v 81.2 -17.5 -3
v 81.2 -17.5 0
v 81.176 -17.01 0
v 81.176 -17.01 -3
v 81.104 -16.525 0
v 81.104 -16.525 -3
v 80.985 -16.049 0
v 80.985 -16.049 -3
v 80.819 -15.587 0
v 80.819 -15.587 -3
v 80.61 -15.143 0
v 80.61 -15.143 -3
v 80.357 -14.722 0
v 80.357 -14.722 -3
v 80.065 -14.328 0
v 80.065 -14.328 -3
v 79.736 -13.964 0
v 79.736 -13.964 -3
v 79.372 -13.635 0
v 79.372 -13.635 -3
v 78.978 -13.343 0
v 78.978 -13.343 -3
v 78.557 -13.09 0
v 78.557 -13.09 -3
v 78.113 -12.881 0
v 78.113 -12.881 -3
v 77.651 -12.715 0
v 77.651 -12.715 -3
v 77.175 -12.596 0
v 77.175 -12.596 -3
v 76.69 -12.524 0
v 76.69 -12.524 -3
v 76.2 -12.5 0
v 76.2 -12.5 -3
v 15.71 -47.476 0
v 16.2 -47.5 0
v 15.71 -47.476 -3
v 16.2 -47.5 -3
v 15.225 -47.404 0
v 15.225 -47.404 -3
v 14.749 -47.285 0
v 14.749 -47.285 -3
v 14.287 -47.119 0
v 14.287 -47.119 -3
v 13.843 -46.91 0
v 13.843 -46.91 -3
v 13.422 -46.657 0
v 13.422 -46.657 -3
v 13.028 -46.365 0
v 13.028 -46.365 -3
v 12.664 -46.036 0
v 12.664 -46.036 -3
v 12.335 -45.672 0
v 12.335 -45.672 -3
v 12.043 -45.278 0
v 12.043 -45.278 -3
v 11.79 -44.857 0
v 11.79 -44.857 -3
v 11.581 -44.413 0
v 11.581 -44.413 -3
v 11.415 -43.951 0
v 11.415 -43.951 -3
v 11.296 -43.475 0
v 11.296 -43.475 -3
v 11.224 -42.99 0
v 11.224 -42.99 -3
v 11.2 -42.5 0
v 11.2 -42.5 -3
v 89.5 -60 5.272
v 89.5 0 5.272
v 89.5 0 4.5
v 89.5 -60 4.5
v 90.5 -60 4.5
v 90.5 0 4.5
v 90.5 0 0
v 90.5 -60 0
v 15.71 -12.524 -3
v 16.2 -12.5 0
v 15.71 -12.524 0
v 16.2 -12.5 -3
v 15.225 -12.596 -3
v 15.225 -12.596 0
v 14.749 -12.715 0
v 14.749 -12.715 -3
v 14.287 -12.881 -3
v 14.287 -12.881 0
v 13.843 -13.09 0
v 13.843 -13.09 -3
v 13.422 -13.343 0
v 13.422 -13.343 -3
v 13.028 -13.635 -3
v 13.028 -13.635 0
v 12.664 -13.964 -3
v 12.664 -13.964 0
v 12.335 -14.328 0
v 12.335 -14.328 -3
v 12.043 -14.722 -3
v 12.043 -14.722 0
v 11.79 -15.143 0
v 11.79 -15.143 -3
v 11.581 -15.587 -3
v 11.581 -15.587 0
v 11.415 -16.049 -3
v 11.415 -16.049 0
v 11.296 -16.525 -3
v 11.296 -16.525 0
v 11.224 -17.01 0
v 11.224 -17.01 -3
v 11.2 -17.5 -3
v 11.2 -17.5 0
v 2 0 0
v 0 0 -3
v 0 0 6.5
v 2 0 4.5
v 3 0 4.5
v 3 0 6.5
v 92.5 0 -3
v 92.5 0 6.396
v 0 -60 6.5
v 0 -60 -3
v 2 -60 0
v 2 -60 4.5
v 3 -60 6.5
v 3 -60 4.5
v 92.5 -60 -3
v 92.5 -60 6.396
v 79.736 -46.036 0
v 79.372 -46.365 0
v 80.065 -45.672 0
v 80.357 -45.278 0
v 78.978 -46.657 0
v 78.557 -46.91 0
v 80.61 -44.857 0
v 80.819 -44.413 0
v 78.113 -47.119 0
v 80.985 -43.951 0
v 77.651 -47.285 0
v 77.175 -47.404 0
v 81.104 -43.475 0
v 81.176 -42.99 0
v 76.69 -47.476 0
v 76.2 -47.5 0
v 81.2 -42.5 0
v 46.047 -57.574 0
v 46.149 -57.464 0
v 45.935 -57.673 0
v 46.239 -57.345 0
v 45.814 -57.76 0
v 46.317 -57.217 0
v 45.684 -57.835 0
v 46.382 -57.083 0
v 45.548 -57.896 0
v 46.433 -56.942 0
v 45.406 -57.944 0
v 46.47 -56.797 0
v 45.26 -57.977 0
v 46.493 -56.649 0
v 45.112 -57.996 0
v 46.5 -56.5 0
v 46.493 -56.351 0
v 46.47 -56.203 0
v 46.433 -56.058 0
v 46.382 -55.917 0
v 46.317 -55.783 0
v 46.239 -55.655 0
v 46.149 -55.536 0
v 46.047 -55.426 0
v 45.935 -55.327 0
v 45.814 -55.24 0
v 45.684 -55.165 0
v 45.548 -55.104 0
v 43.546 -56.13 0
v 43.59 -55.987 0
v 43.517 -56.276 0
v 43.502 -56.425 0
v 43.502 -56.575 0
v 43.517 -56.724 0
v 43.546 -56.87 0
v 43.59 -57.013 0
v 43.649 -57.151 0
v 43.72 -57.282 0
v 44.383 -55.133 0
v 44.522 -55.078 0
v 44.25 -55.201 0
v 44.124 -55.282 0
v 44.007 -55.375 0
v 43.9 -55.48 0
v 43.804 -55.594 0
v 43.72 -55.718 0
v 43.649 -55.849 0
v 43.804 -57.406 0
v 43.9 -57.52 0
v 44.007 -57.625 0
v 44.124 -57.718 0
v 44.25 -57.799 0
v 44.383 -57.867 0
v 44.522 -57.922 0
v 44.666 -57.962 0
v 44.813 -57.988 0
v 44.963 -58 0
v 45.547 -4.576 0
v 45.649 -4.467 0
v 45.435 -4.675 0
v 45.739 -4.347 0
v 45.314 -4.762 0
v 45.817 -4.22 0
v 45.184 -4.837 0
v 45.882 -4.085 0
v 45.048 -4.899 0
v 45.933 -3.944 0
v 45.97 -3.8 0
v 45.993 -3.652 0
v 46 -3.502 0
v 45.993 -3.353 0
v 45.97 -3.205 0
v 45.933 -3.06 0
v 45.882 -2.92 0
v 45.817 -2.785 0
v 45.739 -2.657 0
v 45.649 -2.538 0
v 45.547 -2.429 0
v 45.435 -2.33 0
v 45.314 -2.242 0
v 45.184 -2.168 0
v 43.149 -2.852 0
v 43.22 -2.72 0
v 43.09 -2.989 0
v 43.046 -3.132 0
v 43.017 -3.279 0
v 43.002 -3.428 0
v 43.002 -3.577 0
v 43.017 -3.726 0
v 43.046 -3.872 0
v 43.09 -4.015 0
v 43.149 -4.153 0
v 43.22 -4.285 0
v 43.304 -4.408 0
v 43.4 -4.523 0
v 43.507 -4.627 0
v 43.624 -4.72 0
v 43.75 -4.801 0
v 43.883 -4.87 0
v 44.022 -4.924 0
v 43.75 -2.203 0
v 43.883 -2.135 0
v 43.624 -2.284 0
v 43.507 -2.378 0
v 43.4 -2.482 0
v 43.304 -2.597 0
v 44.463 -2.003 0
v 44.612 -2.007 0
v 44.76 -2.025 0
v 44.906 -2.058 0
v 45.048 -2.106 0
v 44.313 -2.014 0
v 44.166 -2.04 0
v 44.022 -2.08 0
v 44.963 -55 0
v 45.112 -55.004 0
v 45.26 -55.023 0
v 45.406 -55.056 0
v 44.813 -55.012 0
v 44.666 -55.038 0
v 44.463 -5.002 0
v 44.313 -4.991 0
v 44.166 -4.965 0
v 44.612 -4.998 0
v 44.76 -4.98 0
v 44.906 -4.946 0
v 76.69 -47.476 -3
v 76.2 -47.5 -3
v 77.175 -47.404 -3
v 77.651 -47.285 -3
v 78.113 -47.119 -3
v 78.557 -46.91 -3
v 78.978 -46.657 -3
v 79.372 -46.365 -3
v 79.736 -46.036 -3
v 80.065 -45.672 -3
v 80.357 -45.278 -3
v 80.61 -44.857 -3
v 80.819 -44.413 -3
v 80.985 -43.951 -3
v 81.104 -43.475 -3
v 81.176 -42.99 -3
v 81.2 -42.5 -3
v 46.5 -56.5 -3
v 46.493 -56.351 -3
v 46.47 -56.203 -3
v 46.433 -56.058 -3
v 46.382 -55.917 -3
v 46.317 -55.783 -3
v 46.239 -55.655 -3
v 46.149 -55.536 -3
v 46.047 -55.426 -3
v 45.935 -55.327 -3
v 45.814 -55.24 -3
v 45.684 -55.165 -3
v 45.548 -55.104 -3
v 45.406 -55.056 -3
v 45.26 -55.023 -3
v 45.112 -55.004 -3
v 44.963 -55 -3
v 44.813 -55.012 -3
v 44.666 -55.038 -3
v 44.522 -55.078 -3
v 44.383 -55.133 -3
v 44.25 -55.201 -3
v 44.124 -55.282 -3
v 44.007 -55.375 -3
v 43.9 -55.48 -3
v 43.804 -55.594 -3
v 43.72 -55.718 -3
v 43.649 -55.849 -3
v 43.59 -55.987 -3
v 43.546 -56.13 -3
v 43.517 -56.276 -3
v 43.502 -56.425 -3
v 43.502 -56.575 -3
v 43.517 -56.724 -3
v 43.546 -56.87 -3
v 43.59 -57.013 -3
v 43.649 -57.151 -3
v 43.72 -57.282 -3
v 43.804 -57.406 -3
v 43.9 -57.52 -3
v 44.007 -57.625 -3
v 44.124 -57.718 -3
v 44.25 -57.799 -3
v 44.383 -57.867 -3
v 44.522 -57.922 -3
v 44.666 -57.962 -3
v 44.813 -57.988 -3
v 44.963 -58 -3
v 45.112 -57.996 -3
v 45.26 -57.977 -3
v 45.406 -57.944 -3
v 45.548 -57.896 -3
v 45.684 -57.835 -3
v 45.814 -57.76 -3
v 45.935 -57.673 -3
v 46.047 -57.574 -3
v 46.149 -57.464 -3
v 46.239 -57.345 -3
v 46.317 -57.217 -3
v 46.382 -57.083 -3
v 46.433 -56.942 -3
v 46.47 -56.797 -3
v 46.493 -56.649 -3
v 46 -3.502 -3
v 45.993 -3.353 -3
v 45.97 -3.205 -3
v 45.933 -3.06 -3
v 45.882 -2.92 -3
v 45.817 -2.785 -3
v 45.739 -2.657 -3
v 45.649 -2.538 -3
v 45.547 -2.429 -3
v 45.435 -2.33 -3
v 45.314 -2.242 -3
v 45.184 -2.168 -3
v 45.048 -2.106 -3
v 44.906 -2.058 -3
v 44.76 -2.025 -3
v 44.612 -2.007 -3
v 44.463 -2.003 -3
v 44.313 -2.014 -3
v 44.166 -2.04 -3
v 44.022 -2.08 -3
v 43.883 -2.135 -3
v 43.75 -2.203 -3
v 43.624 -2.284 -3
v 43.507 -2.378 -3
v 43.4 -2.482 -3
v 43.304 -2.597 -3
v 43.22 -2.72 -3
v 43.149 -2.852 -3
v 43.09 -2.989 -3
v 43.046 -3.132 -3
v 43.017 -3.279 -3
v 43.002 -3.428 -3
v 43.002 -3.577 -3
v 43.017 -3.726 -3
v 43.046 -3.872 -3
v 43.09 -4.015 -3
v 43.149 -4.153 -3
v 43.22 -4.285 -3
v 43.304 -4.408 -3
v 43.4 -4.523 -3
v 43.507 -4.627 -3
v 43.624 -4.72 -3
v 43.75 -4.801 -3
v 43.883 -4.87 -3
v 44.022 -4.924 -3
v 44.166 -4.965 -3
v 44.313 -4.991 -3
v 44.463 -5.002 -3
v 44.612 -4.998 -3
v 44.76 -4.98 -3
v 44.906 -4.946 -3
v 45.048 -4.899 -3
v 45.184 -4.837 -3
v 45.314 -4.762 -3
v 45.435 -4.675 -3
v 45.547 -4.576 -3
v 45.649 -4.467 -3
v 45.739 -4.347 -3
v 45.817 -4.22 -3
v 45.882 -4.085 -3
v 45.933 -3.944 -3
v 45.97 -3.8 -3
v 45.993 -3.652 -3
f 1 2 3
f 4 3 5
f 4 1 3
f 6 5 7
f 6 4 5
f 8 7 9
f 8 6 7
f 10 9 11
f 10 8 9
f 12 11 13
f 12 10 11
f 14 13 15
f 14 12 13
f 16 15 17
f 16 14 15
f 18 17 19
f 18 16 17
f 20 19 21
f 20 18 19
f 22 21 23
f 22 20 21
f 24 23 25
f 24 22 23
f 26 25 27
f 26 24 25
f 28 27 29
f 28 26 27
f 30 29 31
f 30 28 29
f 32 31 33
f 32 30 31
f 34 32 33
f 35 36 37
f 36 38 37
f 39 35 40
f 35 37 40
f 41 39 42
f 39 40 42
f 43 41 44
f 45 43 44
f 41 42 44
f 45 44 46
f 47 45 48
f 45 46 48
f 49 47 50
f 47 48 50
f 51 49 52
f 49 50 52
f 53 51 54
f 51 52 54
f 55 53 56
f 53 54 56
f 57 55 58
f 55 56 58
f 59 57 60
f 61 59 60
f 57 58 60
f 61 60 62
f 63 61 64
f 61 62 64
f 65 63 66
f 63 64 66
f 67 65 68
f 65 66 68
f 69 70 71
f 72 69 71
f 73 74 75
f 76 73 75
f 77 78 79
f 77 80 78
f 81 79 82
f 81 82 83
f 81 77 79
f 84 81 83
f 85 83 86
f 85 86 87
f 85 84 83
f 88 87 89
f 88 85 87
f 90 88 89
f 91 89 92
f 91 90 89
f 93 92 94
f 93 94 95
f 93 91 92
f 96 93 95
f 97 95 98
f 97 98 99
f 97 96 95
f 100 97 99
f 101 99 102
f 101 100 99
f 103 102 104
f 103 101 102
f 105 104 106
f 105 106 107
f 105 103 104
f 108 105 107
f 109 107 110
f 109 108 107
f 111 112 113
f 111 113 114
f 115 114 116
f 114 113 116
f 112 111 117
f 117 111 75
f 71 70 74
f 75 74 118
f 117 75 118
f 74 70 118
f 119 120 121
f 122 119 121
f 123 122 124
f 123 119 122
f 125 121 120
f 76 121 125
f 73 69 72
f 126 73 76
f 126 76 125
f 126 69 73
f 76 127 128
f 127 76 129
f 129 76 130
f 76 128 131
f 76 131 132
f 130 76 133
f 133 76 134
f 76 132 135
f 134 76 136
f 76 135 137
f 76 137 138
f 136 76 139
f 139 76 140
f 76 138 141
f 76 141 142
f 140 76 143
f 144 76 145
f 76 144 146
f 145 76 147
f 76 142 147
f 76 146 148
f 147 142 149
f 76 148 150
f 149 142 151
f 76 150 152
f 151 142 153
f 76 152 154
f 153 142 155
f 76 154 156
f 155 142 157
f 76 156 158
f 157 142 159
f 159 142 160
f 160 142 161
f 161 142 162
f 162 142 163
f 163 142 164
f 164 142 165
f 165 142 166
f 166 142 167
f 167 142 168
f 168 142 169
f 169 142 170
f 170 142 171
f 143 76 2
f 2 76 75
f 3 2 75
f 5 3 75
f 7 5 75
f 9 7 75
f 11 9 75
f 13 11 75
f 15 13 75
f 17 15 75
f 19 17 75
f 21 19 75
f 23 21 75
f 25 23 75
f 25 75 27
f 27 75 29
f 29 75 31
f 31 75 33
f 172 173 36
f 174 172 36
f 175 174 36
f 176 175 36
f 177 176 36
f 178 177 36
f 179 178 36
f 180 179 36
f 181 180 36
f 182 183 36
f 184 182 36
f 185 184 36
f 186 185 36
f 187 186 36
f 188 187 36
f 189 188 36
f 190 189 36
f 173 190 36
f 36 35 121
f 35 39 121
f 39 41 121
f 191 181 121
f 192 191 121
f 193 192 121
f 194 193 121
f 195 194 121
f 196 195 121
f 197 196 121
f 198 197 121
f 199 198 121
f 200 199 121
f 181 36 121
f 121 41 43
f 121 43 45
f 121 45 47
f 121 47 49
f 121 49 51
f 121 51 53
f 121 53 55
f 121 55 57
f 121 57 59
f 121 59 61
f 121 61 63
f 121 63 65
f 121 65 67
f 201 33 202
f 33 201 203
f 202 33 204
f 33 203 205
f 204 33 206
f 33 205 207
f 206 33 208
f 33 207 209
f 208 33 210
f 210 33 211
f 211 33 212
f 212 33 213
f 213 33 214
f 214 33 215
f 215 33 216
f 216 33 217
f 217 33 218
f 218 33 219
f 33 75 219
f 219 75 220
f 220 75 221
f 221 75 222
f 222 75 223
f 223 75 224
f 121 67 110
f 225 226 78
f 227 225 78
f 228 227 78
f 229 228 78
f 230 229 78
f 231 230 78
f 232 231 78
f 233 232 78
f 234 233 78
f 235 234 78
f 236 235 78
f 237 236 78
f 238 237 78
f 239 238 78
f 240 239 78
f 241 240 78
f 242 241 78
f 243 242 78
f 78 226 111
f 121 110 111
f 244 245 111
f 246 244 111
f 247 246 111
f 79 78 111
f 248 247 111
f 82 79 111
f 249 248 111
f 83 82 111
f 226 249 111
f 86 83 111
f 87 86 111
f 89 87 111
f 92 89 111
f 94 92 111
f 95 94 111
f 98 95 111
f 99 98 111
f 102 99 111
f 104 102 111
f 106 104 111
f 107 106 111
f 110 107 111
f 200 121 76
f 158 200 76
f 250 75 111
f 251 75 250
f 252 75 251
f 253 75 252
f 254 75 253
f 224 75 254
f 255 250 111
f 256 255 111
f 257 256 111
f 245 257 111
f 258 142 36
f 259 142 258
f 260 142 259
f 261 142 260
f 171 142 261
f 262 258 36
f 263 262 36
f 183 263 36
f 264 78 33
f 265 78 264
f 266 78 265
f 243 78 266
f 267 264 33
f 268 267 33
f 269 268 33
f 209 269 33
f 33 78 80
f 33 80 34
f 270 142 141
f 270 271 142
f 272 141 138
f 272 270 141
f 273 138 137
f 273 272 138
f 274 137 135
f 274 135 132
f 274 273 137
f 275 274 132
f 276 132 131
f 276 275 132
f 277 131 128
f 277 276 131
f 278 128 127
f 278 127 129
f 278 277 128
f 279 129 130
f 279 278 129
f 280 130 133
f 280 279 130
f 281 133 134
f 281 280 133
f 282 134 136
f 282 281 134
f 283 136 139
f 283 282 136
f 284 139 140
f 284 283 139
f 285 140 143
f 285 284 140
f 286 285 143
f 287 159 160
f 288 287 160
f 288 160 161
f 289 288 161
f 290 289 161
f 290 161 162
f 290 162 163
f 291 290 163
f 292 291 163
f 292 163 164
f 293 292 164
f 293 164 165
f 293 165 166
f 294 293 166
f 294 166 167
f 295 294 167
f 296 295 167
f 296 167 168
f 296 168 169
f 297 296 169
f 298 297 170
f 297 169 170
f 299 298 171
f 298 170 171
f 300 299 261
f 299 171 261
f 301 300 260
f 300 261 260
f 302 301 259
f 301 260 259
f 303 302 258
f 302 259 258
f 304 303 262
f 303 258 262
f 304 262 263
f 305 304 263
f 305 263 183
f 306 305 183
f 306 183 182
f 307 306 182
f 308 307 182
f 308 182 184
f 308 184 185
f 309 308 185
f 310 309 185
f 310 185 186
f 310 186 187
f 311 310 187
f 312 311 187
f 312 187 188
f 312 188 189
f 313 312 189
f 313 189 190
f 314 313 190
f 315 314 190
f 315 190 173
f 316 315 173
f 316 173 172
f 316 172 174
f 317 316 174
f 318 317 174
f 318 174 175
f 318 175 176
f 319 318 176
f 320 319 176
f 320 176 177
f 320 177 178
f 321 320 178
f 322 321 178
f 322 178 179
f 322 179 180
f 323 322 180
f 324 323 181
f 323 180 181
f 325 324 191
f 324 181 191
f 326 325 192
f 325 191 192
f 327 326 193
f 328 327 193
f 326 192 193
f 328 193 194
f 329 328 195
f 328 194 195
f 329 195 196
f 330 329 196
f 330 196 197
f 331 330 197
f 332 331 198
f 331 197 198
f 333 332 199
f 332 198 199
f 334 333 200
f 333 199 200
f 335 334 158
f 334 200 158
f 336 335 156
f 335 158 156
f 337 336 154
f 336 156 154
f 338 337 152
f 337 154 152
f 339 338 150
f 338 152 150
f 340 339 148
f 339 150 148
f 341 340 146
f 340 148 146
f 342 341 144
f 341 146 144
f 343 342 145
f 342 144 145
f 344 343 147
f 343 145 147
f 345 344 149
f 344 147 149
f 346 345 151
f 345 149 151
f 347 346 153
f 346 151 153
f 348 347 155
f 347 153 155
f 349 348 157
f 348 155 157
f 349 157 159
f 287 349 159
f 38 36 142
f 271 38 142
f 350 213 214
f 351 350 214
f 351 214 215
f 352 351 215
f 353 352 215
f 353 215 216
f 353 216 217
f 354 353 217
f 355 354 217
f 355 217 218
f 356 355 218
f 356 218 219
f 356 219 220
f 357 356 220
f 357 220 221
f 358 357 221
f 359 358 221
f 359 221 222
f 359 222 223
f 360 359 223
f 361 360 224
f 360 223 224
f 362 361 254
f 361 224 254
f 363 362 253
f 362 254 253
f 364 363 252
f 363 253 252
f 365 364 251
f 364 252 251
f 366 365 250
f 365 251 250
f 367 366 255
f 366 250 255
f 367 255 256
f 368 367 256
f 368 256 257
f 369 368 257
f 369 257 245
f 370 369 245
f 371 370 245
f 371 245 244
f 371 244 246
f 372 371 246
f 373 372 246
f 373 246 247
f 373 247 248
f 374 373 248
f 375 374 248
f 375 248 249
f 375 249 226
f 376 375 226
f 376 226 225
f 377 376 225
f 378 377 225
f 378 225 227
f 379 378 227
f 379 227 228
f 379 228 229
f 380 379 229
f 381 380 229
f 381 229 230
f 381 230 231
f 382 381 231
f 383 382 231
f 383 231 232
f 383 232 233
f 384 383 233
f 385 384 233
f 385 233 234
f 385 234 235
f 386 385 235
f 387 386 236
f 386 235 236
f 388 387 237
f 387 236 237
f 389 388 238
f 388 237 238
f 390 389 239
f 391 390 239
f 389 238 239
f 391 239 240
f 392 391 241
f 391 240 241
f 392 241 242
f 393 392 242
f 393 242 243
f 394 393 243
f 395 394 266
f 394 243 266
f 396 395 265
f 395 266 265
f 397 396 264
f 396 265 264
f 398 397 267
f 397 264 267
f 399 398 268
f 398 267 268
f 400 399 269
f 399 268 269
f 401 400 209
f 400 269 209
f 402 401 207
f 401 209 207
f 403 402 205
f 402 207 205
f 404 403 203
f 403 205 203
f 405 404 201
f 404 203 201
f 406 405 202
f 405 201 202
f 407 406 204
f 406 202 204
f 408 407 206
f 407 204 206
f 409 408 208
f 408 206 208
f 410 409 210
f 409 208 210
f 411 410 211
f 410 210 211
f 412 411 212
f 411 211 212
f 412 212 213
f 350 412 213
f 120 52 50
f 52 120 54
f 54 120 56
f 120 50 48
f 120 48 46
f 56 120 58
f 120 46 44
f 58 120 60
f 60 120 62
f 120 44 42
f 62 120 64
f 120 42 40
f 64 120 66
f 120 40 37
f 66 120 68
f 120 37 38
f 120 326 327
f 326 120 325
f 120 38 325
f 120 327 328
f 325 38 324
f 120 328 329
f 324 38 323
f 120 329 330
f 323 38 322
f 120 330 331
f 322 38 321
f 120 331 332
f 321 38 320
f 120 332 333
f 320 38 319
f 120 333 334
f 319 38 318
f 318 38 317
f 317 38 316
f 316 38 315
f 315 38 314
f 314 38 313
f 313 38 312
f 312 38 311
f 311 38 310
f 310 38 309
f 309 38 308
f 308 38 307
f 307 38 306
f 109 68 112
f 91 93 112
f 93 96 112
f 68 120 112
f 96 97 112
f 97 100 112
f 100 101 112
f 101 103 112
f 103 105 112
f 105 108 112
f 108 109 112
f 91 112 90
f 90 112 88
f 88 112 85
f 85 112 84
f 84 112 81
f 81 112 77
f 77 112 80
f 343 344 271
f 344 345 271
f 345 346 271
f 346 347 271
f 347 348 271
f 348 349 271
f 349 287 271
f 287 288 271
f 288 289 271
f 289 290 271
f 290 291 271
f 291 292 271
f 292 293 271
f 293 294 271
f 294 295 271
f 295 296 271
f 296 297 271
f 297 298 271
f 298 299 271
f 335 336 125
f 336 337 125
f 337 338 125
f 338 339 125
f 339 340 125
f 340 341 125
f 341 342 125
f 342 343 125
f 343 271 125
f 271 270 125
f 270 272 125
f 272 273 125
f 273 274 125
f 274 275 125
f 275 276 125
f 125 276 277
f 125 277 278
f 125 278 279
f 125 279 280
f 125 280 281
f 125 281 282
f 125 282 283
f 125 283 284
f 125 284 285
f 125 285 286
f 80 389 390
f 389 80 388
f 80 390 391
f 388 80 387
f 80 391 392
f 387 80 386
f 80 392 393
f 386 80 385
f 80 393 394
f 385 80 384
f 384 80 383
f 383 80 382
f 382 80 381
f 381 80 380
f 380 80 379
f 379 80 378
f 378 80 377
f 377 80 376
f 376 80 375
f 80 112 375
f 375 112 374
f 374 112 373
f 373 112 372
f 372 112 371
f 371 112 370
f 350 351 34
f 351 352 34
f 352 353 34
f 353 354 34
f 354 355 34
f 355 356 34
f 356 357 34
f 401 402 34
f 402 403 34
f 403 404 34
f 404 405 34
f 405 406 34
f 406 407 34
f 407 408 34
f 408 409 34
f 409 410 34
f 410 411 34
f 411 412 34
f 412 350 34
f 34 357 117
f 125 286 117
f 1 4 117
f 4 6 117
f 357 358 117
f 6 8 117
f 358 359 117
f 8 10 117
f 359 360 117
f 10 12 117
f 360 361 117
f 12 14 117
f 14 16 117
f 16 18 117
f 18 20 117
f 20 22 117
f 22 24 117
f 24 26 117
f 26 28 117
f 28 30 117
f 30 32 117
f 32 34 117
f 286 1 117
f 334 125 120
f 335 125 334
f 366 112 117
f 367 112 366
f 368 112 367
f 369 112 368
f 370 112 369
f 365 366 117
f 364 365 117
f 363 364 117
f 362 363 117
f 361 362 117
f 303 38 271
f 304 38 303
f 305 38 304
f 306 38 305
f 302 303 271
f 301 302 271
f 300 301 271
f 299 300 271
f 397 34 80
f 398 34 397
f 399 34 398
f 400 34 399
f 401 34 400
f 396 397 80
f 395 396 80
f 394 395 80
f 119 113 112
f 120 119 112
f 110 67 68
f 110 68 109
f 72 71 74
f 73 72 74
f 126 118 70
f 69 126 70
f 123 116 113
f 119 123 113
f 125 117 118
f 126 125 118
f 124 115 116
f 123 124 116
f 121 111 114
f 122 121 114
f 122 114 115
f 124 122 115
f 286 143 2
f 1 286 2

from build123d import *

# Parameters (mm, degrees)
F1_DEPTH = 60
F2_R     = 1.5
F3_DEPTH = 25
F4_W     = 70
F4_H     = 35
F5_DEPTH = 25
F6_R     = 5


with BuildPart() as f1:
    # F0 (on Front) → F1 (new body)
    with BuildSketch(Plane.XZ):
        Polygon((0, 6.5), (0, 0), (0, -3), (3, -3), (92.5, -3), (92.5, 0), (92.5, 6.395918), (89.5, 5.27192), (89.5, 4.5), (90.5, 4.5), (90.5, 0), (2, 0), (2, 4.5), (3, 4.5), (3, 6.5), align=None)
    extrude(amount=F1_DEPTH)

    # F2 (on face) → F3 (cut)
    with BuildSketch(Plane.XY):
        with Locations((45, -56.5)):
            Circle(F2_R)
        with Locations((44.5, -3.502359)):
            Circle(F2_R)
    extrude(amount=-F3_DEPTH, mode=Mode.SUBTRACT)

    # F4 (on face) → F5 (cut)
    with BuildSketch(Plane.XY):
        with Locations((46.2, -30)):
            Rectangle(F4_W, F4_H)
    extrude(amount=-F5_DEPTH, mode=Mode.SUBTRACT)

    # F6
    f6_edges = [f1.edges().sort_by_distance(p)[0] for p in [
        (11.2, -12.5, -1.5),
        (81.2, -47.5, -1.5),
        (81.2, -12.5, -1.5),
        (11.2, -47.5, -1.5),
    ]]
    fillet(f6_edges, radius=F6_R)


solid = f1.part
